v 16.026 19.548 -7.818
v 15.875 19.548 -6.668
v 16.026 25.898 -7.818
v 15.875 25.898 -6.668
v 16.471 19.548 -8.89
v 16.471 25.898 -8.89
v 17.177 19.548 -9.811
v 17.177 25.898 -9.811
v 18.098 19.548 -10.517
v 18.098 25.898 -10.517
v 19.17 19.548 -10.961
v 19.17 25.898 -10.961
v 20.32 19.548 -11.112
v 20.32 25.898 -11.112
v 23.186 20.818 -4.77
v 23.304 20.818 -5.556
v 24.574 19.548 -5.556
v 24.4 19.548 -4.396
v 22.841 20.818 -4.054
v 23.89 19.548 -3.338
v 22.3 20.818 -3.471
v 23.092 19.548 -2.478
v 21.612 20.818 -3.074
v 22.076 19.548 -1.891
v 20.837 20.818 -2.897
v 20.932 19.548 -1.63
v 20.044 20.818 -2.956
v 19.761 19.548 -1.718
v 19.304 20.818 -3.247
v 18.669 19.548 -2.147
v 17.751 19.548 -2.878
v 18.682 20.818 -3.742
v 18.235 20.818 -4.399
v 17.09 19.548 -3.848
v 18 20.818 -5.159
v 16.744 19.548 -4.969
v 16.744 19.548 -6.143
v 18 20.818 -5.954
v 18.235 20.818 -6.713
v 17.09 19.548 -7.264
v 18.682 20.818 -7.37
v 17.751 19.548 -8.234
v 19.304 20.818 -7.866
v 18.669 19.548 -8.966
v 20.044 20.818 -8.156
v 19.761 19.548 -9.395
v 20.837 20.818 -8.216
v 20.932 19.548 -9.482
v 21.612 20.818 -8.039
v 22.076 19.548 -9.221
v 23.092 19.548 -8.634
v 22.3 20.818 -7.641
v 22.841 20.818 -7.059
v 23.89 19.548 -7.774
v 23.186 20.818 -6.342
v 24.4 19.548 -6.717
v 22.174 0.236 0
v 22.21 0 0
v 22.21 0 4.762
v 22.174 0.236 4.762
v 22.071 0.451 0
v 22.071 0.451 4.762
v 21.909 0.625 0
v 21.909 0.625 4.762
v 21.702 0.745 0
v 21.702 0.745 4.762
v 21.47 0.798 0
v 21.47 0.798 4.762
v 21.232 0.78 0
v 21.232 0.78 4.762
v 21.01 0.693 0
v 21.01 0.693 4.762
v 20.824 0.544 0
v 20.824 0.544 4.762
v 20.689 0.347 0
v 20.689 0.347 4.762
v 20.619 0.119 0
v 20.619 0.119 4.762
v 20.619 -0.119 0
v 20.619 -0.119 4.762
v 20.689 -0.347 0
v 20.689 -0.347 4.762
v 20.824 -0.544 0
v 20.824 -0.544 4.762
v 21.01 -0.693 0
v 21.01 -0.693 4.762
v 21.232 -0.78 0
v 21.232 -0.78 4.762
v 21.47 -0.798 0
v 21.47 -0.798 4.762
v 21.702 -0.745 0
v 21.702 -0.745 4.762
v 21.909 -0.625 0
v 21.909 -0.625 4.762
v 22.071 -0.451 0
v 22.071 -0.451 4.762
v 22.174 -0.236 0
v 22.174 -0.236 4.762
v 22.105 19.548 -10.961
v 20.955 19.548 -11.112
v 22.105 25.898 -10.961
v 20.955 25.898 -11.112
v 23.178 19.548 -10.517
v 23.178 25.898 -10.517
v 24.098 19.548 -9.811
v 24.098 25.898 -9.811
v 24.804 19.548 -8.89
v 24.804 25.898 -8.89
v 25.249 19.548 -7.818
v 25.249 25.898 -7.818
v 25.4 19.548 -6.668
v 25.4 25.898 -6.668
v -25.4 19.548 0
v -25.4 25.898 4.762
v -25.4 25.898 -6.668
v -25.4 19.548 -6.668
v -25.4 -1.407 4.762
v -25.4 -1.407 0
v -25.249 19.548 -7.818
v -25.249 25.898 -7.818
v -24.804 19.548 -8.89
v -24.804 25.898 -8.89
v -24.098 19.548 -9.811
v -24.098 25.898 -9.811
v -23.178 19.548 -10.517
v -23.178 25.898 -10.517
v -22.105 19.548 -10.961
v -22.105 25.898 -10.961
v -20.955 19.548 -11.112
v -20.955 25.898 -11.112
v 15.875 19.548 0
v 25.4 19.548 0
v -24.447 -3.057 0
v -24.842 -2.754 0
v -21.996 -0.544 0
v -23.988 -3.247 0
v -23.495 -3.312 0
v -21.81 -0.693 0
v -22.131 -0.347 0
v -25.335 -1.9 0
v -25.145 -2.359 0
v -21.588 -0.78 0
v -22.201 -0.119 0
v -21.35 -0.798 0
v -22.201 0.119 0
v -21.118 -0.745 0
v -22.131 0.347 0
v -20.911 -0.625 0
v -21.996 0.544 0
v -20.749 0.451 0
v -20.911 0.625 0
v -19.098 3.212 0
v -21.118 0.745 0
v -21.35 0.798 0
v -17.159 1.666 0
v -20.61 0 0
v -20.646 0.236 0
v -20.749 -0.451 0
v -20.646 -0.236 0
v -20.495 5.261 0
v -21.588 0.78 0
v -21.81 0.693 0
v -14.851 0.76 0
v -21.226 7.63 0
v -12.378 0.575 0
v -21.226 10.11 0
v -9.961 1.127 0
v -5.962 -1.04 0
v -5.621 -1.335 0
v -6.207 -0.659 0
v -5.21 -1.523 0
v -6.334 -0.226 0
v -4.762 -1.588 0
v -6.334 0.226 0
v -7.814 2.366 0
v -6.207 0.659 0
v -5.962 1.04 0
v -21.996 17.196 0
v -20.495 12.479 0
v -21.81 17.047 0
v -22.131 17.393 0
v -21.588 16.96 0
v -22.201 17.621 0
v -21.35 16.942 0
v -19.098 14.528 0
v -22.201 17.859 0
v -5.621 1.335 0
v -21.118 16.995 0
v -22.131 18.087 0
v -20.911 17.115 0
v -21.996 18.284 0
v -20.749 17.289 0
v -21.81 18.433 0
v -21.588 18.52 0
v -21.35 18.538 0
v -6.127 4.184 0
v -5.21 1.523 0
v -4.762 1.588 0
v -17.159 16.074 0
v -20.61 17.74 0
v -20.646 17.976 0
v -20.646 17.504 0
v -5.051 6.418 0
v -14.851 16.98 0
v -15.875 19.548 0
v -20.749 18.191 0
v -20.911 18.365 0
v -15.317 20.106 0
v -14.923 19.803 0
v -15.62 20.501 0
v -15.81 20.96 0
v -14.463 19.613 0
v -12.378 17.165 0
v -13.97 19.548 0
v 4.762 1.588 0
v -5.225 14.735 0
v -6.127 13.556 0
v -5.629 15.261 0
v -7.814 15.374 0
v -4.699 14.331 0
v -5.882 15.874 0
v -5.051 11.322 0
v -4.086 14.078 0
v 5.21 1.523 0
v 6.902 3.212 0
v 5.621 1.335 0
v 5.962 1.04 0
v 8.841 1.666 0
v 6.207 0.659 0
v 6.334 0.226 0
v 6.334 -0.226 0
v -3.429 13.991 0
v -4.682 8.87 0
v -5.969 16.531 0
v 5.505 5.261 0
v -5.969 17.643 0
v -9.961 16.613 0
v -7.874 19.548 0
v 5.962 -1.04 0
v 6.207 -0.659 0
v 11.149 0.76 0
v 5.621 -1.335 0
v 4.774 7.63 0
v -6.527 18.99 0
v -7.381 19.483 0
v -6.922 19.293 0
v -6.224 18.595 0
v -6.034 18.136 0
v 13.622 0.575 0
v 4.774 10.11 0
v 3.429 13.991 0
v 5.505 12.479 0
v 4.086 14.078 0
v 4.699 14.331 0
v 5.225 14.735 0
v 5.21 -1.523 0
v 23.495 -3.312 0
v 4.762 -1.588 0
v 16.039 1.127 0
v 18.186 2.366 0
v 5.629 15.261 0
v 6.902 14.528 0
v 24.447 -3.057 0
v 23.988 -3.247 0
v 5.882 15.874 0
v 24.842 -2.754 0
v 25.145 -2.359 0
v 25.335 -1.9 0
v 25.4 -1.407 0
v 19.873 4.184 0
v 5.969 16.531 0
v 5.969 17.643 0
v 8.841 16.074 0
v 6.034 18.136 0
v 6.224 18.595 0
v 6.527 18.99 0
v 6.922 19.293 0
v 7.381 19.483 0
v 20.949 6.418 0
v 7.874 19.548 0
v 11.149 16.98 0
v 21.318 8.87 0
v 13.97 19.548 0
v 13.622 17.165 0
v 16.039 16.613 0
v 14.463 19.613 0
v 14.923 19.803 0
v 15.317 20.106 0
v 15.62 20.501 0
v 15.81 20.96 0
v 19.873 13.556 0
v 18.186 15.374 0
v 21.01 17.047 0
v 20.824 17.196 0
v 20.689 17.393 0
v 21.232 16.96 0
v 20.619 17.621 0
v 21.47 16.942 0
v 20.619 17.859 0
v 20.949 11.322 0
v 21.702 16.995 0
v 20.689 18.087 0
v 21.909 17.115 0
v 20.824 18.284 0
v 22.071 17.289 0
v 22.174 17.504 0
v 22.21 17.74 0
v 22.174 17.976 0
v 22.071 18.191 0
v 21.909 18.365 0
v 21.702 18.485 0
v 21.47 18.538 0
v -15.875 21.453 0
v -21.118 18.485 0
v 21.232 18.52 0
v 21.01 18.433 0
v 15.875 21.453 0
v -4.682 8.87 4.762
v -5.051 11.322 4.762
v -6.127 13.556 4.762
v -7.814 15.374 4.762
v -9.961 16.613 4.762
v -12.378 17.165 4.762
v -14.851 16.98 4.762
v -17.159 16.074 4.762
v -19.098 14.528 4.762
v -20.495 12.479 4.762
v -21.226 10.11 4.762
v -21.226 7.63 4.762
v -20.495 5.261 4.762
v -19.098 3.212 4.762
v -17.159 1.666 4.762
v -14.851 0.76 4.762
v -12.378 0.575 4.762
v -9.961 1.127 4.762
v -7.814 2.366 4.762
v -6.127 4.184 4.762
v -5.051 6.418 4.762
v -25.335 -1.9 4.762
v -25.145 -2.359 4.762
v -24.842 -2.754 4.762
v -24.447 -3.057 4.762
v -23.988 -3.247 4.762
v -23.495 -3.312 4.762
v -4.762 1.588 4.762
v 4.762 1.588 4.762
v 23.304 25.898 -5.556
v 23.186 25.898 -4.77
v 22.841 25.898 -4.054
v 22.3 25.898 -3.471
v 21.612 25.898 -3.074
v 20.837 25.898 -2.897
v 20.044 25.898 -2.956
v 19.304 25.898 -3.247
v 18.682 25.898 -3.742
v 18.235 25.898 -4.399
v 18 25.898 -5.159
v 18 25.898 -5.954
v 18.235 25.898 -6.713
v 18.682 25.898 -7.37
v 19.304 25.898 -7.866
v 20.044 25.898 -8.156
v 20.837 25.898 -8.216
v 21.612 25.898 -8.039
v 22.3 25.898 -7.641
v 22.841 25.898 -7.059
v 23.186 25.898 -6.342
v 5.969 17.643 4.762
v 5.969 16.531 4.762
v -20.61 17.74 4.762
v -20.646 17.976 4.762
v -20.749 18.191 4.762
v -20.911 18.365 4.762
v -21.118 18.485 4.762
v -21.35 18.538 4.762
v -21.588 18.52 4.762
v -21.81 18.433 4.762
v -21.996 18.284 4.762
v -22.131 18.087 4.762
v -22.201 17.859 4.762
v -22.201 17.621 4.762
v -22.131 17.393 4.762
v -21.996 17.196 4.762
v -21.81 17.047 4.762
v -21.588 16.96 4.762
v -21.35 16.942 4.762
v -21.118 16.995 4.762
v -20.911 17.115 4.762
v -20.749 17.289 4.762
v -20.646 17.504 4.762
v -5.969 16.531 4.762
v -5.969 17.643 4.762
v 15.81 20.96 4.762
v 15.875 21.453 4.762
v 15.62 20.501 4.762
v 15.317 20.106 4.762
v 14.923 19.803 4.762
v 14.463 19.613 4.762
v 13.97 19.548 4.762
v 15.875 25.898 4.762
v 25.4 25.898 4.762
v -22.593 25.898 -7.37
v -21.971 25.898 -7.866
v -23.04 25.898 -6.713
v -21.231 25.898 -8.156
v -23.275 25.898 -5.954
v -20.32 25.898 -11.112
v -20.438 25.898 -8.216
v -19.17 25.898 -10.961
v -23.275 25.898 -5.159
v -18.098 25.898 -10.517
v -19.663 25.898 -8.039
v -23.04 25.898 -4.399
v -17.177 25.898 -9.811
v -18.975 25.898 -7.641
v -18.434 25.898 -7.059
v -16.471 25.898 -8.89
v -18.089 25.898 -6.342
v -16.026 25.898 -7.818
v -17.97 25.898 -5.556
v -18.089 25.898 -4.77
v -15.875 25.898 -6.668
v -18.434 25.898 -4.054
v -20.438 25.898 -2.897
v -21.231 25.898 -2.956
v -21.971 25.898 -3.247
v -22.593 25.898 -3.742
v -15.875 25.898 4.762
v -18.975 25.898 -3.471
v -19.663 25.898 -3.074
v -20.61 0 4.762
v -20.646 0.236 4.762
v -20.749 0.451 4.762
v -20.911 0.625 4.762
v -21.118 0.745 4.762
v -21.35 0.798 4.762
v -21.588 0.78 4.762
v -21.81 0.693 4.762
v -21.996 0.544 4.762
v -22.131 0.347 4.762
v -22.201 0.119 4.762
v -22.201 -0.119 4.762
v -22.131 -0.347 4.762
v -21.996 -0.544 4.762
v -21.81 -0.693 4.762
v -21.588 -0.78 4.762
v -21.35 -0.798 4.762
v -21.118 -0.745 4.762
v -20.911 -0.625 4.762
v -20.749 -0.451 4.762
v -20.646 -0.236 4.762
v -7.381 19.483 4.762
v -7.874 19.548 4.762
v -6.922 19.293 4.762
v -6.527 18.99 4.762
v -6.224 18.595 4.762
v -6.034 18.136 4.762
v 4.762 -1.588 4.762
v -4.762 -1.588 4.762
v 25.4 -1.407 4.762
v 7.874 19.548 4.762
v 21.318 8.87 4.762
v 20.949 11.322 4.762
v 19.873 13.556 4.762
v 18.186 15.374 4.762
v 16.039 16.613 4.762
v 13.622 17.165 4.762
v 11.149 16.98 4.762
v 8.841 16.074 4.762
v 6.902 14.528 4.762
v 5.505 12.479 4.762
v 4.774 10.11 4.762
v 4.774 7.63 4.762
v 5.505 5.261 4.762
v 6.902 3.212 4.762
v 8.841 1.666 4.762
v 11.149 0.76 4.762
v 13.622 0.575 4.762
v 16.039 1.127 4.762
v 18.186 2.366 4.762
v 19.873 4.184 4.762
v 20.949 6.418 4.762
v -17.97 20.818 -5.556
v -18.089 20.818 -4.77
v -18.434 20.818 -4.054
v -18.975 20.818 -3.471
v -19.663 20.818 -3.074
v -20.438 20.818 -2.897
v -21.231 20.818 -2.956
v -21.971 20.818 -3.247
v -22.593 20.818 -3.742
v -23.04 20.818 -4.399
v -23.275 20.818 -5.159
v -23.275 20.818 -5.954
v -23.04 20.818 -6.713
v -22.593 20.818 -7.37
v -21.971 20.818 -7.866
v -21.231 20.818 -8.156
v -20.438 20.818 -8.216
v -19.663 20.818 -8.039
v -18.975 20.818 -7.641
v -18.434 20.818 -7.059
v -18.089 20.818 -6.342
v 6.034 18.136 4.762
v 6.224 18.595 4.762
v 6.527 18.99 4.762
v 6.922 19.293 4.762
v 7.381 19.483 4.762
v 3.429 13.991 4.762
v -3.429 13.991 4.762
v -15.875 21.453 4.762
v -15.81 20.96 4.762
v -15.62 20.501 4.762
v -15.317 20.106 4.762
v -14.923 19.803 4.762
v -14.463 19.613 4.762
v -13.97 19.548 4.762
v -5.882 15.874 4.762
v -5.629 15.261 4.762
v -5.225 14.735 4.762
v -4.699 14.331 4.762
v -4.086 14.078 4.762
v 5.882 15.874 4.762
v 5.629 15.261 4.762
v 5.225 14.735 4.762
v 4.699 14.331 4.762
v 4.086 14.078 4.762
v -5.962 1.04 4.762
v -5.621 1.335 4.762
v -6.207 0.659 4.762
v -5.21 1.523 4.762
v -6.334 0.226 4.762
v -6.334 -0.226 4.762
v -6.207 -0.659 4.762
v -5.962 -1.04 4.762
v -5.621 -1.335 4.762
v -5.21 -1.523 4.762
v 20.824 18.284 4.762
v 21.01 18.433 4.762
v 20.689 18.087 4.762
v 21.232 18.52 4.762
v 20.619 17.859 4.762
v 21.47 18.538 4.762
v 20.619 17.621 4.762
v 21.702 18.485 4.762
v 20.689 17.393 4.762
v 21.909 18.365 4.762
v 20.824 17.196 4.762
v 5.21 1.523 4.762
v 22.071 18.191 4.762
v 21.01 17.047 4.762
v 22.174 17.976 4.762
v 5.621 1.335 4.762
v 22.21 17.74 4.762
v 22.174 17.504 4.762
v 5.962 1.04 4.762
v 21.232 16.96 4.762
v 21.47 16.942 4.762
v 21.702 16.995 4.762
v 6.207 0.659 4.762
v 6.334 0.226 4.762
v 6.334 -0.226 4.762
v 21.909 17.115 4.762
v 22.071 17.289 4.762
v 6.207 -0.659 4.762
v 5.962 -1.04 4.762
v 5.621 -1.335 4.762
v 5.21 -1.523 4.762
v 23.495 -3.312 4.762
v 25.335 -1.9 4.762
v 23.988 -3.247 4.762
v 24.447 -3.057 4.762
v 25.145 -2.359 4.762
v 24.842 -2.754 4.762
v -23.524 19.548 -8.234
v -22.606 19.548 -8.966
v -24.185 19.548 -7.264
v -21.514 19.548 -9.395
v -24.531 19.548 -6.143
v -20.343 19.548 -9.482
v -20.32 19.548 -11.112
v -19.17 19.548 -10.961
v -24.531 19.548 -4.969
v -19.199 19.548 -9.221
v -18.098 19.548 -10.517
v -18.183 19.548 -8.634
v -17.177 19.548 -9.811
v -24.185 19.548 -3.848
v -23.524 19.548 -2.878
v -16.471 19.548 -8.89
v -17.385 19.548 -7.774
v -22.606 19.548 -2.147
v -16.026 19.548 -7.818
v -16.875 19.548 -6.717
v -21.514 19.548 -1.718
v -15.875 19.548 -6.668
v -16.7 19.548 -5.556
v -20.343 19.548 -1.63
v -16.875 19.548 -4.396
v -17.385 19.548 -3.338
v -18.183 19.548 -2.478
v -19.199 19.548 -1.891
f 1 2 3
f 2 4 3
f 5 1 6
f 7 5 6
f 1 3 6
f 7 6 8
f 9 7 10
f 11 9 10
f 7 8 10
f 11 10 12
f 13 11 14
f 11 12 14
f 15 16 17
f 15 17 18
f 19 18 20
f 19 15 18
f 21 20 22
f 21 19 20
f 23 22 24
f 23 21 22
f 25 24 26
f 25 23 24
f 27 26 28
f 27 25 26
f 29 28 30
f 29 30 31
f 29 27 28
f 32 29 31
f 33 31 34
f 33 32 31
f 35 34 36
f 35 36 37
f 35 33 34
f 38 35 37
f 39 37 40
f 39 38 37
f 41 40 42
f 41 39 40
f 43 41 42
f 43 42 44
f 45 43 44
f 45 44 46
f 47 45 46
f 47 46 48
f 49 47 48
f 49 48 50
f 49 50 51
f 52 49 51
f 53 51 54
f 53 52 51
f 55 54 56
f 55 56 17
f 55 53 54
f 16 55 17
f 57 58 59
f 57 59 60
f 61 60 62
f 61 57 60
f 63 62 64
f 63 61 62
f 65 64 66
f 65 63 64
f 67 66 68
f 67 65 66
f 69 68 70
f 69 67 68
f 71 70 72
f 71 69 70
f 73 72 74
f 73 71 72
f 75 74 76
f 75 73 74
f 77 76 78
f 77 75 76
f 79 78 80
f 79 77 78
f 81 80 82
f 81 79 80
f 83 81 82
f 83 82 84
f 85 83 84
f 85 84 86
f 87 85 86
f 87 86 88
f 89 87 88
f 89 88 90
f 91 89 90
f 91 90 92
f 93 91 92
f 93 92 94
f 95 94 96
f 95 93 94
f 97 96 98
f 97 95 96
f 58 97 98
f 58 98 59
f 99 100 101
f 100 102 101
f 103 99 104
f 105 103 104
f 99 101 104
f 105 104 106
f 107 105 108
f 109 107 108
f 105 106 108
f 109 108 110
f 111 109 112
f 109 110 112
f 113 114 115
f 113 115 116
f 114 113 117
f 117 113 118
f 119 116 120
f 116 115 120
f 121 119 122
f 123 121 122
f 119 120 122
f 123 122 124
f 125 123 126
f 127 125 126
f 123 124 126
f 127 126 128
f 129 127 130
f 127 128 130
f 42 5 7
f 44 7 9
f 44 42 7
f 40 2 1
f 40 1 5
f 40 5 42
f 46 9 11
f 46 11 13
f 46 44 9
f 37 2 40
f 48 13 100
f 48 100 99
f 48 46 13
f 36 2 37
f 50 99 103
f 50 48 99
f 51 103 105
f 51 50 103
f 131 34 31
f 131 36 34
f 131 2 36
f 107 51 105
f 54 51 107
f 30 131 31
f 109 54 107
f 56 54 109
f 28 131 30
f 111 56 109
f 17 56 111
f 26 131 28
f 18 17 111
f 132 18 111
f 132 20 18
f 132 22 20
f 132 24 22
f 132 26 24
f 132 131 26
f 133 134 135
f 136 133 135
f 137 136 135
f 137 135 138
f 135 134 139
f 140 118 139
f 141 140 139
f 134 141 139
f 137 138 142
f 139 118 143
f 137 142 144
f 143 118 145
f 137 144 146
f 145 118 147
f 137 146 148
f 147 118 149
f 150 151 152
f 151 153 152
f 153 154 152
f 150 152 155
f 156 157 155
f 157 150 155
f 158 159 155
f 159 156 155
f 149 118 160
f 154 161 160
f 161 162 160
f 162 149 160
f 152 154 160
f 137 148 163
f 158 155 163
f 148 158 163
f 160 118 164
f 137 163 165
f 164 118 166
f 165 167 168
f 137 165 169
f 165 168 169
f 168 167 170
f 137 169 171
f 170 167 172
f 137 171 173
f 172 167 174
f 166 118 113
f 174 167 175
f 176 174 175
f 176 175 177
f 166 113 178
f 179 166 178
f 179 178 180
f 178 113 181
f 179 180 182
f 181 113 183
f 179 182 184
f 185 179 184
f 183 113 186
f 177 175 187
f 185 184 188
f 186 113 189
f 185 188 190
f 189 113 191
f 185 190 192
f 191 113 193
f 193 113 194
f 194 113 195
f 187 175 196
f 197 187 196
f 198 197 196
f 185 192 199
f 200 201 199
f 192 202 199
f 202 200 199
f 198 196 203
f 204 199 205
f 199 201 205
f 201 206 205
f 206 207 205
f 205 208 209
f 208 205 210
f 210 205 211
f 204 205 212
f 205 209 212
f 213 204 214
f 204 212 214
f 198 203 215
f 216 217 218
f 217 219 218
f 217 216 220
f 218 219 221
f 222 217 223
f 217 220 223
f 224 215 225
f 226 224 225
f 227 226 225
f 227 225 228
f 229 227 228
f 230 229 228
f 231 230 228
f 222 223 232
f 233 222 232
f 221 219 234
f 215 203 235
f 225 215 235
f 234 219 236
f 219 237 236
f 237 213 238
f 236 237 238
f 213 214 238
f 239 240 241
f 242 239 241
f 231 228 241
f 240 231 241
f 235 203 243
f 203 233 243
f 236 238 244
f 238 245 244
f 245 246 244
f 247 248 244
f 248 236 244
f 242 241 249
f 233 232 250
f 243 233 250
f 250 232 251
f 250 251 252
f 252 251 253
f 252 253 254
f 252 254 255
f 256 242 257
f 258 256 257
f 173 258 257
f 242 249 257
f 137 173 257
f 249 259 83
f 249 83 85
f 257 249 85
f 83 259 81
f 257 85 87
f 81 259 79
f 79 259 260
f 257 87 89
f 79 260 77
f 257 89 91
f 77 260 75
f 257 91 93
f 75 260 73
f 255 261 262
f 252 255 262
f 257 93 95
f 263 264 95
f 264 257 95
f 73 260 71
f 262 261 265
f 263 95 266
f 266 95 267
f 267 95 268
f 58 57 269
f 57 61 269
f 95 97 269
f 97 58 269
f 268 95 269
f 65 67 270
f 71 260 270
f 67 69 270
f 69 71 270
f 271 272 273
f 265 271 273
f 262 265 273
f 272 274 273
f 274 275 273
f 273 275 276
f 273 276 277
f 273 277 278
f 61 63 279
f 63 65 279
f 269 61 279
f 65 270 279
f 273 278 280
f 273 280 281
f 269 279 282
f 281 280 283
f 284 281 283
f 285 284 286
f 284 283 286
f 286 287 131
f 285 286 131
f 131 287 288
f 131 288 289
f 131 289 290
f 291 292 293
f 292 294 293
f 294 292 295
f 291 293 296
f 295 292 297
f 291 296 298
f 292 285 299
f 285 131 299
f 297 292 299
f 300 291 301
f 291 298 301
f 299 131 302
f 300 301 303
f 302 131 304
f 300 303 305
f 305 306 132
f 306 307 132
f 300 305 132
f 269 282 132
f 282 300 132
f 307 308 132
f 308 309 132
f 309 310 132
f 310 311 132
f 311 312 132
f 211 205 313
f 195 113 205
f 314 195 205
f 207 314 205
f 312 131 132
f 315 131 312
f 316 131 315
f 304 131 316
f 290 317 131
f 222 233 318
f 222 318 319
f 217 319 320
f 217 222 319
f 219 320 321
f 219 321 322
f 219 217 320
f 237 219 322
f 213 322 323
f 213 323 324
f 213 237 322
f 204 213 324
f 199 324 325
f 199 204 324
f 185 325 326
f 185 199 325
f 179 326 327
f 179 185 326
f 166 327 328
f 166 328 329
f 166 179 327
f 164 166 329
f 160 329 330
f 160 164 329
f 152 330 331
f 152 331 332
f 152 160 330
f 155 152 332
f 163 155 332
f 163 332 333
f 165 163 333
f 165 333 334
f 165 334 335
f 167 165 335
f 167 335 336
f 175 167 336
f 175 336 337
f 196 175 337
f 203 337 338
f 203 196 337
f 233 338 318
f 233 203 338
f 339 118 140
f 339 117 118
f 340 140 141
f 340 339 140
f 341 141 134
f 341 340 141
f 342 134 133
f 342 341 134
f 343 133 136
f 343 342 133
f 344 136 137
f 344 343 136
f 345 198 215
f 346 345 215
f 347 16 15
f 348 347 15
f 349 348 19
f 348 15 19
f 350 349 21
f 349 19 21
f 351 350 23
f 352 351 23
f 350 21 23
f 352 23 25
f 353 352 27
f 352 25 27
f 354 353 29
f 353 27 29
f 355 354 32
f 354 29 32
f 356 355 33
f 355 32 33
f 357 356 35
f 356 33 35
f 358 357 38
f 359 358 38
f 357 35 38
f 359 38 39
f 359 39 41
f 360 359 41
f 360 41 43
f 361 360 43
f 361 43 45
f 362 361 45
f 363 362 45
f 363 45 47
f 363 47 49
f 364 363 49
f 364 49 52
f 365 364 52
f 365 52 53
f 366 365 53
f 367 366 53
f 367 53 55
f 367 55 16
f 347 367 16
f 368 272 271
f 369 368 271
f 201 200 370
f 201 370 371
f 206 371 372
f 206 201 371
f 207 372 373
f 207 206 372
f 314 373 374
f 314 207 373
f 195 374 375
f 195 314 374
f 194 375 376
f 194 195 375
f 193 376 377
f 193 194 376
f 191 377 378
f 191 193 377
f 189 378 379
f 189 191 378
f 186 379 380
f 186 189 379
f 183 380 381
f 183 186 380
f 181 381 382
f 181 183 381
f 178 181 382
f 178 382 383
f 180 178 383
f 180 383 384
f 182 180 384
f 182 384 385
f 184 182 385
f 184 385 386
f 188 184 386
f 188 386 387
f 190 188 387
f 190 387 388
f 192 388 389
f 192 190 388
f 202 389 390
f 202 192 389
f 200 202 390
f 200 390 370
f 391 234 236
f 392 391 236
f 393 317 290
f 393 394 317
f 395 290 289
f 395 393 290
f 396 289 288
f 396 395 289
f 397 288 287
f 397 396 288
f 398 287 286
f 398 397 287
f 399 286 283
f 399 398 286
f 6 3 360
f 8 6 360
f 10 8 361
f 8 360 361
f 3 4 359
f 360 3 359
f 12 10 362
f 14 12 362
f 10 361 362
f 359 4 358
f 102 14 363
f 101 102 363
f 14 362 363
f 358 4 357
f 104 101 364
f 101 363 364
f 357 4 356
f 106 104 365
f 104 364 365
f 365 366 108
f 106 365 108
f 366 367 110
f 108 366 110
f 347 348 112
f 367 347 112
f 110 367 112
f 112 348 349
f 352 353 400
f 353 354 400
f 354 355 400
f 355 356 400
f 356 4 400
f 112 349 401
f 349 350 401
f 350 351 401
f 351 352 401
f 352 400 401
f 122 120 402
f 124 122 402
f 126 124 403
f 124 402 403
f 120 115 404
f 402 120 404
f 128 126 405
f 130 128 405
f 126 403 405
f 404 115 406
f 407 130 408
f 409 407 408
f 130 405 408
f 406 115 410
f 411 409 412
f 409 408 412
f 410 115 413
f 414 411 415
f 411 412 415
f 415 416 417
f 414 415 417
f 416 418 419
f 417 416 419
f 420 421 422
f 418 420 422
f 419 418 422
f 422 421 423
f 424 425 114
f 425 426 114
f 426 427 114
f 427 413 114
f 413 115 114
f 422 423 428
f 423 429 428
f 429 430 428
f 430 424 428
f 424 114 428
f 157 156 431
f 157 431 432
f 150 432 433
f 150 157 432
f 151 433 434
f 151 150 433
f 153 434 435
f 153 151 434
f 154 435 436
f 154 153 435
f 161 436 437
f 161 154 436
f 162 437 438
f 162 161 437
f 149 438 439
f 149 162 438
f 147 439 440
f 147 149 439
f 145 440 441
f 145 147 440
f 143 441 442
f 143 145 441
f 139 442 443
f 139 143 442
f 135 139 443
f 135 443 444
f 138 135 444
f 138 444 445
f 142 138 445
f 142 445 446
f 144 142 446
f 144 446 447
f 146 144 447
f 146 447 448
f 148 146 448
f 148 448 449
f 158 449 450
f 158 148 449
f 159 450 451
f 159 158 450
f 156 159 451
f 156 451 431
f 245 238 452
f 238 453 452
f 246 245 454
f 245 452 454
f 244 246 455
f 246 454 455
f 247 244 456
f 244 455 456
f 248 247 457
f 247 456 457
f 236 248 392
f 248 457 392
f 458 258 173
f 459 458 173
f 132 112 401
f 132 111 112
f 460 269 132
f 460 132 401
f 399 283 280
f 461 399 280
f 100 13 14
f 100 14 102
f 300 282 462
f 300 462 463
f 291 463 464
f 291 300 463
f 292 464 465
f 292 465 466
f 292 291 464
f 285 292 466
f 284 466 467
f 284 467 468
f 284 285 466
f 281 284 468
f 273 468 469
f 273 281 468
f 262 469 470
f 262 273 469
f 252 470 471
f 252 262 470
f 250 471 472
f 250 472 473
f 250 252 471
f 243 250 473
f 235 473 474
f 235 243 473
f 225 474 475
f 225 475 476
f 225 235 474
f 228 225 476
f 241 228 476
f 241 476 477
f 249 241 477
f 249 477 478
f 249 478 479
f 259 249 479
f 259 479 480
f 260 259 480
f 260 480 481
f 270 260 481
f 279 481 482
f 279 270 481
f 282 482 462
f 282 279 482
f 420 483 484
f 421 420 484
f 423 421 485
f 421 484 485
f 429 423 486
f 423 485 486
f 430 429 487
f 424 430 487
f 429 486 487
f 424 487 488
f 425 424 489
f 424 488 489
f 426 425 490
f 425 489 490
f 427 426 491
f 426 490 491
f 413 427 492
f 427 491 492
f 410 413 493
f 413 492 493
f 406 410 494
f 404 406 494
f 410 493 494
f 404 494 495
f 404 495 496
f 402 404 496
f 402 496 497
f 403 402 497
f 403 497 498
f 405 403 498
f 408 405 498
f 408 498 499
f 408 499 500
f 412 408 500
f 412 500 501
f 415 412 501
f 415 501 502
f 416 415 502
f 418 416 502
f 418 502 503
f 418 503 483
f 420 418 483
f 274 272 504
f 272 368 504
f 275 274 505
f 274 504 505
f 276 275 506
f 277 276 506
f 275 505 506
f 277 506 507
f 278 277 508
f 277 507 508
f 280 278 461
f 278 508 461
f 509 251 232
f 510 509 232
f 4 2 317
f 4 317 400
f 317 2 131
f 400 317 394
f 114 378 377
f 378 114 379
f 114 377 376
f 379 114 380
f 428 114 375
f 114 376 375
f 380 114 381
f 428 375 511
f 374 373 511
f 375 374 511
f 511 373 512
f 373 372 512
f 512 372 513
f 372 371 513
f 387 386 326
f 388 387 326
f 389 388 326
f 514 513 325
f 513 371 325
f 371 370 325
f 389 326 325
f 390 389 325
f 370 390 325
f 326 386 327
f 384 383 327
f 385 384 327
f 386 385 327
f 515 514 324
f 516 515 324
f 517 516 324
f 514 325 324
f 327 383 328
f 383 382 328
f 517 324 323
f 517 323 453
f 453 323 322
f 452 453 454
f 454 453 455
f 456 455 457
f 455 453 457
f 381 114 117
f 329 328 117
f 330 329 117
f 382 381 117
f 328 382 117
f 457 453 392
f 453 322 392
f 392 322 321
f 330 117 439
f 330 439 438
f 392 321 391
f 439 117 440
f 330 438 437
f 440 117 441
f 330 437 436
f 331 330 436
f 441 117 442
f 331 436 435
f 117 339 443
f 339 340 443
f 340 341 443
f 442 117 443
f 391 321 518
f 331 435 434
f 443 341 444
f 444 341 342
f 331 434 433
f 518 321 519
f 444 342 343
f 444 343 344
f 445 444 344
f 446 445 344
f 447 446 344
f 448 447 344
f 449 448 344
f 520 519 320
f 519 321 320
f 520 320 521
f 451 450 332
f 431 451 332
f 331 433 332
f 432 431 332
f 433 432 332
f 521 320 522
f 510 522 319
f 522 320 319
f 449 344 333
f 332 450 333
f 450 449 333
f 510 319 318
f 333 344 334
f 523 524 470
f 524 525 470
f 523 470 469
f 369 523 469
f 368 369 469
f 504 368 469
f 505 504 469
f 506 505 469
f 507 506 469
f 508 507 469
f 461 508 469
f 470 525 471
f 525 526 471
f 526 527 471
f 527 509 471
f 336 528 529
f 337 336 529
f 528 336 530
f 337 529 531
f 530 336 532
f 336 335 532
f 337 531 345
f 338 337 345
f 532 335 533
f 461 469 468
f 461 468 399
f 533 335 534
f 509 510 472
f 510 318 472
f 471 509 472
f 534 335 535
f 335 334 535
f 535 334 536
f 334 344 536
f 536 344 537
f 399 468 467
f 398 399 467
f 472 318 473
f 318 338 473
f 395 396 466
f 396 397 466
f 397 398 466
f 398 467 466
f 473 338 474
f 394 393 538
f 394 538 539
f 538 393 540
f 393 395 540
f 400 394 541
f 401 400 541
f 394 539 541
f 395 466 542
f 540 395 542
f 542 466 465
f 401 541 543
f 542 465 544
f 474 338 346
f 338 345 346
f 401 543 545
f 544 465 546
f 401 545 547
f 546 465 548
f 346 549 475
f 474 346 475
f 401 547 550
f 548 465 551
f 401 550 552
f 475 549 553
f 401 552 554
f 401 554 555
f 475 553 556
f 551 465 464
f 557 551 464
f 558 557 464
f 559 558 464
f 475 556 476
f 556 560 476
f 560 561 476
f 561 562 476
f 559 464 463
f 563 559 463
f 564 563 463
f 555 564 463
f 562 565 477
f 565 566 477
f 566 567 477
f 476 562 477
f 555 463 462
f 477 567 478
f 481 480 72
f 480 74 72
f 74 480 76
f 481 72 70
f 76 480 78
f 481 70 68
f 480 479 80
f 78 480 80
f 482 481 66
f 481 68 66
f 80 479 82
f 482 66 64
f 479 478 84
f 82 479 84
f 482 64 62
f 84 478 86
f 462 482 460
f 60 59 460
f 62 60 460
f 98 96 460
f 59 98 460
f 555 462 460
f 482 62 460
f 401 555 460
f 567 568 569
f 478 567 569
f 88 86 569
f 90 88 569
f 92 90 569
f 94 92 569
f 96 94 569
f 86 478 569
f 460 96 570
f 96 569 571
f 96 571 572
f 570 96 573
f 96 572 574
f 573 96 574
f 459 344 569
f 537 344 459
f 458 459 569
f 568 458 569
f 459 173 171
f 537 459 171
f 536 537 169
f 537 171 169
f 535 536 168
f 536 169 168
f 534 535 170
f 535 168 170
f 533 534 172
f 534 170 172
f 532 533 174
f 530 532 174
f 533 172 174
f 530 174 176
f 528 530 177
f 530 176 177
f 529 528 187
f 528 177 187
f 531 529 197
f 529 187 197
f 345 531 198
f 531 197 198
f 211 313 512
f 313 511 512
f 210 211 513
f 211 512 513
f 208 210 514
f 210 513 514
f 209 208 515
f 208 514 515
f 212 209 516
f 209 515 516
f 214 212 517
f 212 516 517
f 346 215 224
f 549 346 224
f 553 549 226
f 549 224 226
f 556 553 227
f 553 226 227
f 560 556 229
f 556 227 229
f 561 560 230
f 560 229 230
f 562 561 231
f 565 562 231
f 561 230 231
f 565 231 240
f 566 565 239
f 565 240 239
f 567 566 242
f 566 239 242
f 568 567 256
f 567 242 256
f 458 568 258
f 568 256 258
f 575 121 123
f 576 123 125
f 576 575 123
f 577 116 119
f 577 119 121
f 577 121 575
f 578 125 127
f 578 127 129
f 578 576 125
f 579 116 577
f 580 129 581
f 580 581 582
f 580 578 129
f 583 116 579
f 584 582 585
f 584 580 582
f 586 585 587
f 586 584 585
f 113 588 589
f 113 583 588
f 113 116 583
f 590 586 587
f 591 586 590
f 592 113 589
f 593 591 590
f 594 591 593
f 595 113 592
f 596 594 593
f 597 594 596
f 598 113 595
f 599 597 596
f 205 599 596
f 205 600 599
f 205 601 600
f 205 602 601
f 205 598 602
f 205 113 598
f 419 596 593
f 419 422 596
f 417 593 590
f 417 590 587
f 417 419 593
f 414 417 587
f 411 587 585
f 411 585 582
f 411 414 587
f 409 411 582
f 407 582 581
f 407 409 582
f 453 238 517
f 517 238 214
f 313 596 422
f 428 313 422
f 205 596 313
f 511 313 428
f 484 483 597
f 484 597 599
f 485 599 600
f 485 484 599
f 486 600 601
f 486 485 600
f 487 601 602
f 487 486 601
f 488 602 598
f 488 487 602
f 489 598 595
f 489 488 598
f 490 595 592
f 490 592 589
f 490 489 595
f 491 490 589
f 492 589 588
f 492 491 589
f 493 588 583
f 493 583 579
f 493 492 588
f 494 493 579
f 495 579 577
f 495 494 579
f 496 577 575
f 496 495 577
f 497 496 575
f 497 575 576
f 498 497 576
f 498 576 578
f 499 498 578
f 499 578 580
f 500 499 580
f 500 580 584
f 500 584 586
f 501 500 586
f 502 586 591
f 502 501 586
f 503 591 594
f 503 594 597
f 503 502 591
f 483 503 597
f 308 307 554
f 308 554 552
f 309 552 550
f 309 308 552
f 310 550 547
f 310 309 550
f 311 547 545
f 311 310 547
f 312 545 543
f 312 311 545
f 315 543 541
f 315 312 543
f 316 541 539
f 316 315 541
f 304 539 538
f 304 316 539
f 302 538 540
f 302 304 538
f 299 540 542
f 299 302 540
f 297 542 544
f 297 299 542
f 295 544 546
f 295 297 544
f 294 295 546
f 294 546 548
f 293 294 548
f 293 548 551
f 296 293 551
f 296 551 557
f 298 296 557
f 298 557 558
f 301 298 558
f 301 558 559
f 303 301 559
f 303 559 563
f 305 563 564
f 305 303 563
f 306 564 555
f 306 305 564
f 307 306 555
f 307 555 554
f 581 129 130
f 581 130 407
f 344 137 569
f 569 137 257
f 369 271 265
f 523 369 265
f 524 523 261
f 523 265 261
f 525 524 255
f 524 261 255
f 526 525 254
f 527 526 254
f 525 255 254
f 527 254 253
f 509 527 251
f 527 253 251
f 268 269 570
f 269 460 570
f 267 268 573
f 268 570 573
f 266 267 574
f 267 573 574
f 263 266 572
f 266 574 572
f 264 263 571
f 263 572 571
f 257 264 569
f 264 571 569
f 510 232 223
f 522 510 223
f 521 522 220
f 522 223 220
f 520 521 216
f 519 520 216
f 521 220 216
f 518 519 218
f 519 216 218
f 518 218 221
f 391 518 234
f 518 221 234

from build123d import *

# Parameters (mm, degrees)
SKETCH10_R          = 0.8
SKETCH10_R_2        = 8.3185
BOSS_EXTRUDE1_DEPTH = 4.7625
SKETCH11_W          = 9.525
SKETCH11_H          = 15.875
BOSS_EXTRUDE2_DEPTH = 6.35
FILLET1_R           = 1.905
SKETCH12_R          = 2.667
CUT_EXTRUDE1_DEPTH  = 7.35
FILLET2_R           = 4.445
CHAMFER1_SIZE       = 1.27


with BuildPart() as part:
    # Sketch10 → Boss-Extrude1 (new body)
    with BuildSketch(Plane.XY):
        with BuildLine():
            Line((5.969, 19.548), (5.969, 16.531104381))
            ThreePointArc((5.969, 16.531104381), (5.225051224, 14.735053157), (3.429, 13.991104381))
            Line((3.429, 13.991104381), (-3.429, 13.991104381))
            ThreePointArc((-3.429, 13.991104381), (-5.225051224, 14.735053157), (-5.969, 16.531104381))
            Line((-5.969, 16.531104381), (-5.969, 19.548))
            Line((-5.969, 19.548), (-25.4, 19.548))
            Line((-25.4, 19.548), (-25.4, -3.312))
            Line((-25.4, -3.312), (25.4, -3.312))
            Line((25.4, -3.312), (25.4, 19.548))
            Line((25.4, 19.548), (5.969, 19.548))
        make_face()
        with Locations((21.41, 17.74)):
            Circle(SKETCH10_R, mode=Mode.SUBTRACT)
        with Locations((21.41, 0)):
            Circle(SKETCH10_R, mode=Mode.SUBTRACT)
        with Locations((-21.41, 17.74)):
            Circle(SKETCH10_R, mode=Mode.SUBTRACT)
        with Locations((-21.41, 0)):
            Circle(SKETCH10_R, mode=Mode.SUBTRACT)
        with Locations((13, 8.87)):
            Circle(SKETCH10_R_2, mode=Mode.SUBTRACT)
        with Locations((-13, 8.87)):
            Circle(SKETCH10_R_2, mode=Mode.SUBTRACT)
        with BuildLine():
            Line((-4.7625, 1.5875), (4.7625, 1.5875))
            ThreePointArc((4.7625, 1.5875), (6.35, 0), (4.7625, -1.5875))
            Line((4.7625, -1.5875), (-4.7625, -1.5875))
            ThreePointArc((-4.7625, -1.5875), (-6.35, 0), (-4.7625, 1.5875))
        make_face(mode=Mode.SUBTRACT)
    extrude(amount=BOSS_EXTRUDE1_DEPTH)

    # Sketch11 → Boss-Extrude2 (add)
    with BuildSketch(Plane.XZ.offset(-19.548)):
        with Locations((20.6375, -3.175)):
            Rectangle(SKETCH11_W, SKETCH11_H)
        with Locations((-20.6375, -3.175)):
            Rectangle(SKETCH11_W, SKETCH11_H)
    extrude(amount=-BOSS_EXTRUDE2_DEPTH)

    # Fillet1
    fillet1_edges = [part.edges().sort_by_distance(p)[0] for p in [
        (25.4, -3.312, 2.38125),
        (-25.4, -3.312, 2.38125),
        (-5.969, 19.548, 2.38125),
        (5.969, 19.548, 2.38125),
        (15.875, 19.548, 2.38125),
        (-15.875, 19.548, 2.38125),
    ]]
    fillet(fillet1_edges, radius=FILLET1_R)

    # Sketch12 → Cut-Extrude1 (cut, through all)
    with BuildSketch(Plane.XZ.offset(-19.548)):
        with Locations((-20.6375, -5.55625)):
            Circle(SKETCH12_R)
        with Locations((20.6375, -5.55625)):
            Circle(SKETCH12_R)
    extrude(amount=-CUT_EXTRUDE1_DEPTH, mode=Mode.SUBTRACT)

    # Fillet2
    fillet2_edges = [part.edges().sort_by_distance(p)[0] for p in [
        (25.4, 22.723, -11.1125),
        (15.875, 22.723, -11.1125),
        (-15.875, 22.723, -11.1125),
        (-25.4, 22.723, -11.1125),
    ]]
    fillet(fillet2_edges, radius=FILLET2_R)

    # Chamfer1
    chamfer1_edges = [part.edges().sort_by_distance(p)[0] for p in [
        (-23.3045, 19.548, -5.55625),
        (17.9705, 19.548, -5.55625),
    ]]
    chamfer(chamfer1_edges, length=CHAMFER1_SIZE)


solid = part.part
